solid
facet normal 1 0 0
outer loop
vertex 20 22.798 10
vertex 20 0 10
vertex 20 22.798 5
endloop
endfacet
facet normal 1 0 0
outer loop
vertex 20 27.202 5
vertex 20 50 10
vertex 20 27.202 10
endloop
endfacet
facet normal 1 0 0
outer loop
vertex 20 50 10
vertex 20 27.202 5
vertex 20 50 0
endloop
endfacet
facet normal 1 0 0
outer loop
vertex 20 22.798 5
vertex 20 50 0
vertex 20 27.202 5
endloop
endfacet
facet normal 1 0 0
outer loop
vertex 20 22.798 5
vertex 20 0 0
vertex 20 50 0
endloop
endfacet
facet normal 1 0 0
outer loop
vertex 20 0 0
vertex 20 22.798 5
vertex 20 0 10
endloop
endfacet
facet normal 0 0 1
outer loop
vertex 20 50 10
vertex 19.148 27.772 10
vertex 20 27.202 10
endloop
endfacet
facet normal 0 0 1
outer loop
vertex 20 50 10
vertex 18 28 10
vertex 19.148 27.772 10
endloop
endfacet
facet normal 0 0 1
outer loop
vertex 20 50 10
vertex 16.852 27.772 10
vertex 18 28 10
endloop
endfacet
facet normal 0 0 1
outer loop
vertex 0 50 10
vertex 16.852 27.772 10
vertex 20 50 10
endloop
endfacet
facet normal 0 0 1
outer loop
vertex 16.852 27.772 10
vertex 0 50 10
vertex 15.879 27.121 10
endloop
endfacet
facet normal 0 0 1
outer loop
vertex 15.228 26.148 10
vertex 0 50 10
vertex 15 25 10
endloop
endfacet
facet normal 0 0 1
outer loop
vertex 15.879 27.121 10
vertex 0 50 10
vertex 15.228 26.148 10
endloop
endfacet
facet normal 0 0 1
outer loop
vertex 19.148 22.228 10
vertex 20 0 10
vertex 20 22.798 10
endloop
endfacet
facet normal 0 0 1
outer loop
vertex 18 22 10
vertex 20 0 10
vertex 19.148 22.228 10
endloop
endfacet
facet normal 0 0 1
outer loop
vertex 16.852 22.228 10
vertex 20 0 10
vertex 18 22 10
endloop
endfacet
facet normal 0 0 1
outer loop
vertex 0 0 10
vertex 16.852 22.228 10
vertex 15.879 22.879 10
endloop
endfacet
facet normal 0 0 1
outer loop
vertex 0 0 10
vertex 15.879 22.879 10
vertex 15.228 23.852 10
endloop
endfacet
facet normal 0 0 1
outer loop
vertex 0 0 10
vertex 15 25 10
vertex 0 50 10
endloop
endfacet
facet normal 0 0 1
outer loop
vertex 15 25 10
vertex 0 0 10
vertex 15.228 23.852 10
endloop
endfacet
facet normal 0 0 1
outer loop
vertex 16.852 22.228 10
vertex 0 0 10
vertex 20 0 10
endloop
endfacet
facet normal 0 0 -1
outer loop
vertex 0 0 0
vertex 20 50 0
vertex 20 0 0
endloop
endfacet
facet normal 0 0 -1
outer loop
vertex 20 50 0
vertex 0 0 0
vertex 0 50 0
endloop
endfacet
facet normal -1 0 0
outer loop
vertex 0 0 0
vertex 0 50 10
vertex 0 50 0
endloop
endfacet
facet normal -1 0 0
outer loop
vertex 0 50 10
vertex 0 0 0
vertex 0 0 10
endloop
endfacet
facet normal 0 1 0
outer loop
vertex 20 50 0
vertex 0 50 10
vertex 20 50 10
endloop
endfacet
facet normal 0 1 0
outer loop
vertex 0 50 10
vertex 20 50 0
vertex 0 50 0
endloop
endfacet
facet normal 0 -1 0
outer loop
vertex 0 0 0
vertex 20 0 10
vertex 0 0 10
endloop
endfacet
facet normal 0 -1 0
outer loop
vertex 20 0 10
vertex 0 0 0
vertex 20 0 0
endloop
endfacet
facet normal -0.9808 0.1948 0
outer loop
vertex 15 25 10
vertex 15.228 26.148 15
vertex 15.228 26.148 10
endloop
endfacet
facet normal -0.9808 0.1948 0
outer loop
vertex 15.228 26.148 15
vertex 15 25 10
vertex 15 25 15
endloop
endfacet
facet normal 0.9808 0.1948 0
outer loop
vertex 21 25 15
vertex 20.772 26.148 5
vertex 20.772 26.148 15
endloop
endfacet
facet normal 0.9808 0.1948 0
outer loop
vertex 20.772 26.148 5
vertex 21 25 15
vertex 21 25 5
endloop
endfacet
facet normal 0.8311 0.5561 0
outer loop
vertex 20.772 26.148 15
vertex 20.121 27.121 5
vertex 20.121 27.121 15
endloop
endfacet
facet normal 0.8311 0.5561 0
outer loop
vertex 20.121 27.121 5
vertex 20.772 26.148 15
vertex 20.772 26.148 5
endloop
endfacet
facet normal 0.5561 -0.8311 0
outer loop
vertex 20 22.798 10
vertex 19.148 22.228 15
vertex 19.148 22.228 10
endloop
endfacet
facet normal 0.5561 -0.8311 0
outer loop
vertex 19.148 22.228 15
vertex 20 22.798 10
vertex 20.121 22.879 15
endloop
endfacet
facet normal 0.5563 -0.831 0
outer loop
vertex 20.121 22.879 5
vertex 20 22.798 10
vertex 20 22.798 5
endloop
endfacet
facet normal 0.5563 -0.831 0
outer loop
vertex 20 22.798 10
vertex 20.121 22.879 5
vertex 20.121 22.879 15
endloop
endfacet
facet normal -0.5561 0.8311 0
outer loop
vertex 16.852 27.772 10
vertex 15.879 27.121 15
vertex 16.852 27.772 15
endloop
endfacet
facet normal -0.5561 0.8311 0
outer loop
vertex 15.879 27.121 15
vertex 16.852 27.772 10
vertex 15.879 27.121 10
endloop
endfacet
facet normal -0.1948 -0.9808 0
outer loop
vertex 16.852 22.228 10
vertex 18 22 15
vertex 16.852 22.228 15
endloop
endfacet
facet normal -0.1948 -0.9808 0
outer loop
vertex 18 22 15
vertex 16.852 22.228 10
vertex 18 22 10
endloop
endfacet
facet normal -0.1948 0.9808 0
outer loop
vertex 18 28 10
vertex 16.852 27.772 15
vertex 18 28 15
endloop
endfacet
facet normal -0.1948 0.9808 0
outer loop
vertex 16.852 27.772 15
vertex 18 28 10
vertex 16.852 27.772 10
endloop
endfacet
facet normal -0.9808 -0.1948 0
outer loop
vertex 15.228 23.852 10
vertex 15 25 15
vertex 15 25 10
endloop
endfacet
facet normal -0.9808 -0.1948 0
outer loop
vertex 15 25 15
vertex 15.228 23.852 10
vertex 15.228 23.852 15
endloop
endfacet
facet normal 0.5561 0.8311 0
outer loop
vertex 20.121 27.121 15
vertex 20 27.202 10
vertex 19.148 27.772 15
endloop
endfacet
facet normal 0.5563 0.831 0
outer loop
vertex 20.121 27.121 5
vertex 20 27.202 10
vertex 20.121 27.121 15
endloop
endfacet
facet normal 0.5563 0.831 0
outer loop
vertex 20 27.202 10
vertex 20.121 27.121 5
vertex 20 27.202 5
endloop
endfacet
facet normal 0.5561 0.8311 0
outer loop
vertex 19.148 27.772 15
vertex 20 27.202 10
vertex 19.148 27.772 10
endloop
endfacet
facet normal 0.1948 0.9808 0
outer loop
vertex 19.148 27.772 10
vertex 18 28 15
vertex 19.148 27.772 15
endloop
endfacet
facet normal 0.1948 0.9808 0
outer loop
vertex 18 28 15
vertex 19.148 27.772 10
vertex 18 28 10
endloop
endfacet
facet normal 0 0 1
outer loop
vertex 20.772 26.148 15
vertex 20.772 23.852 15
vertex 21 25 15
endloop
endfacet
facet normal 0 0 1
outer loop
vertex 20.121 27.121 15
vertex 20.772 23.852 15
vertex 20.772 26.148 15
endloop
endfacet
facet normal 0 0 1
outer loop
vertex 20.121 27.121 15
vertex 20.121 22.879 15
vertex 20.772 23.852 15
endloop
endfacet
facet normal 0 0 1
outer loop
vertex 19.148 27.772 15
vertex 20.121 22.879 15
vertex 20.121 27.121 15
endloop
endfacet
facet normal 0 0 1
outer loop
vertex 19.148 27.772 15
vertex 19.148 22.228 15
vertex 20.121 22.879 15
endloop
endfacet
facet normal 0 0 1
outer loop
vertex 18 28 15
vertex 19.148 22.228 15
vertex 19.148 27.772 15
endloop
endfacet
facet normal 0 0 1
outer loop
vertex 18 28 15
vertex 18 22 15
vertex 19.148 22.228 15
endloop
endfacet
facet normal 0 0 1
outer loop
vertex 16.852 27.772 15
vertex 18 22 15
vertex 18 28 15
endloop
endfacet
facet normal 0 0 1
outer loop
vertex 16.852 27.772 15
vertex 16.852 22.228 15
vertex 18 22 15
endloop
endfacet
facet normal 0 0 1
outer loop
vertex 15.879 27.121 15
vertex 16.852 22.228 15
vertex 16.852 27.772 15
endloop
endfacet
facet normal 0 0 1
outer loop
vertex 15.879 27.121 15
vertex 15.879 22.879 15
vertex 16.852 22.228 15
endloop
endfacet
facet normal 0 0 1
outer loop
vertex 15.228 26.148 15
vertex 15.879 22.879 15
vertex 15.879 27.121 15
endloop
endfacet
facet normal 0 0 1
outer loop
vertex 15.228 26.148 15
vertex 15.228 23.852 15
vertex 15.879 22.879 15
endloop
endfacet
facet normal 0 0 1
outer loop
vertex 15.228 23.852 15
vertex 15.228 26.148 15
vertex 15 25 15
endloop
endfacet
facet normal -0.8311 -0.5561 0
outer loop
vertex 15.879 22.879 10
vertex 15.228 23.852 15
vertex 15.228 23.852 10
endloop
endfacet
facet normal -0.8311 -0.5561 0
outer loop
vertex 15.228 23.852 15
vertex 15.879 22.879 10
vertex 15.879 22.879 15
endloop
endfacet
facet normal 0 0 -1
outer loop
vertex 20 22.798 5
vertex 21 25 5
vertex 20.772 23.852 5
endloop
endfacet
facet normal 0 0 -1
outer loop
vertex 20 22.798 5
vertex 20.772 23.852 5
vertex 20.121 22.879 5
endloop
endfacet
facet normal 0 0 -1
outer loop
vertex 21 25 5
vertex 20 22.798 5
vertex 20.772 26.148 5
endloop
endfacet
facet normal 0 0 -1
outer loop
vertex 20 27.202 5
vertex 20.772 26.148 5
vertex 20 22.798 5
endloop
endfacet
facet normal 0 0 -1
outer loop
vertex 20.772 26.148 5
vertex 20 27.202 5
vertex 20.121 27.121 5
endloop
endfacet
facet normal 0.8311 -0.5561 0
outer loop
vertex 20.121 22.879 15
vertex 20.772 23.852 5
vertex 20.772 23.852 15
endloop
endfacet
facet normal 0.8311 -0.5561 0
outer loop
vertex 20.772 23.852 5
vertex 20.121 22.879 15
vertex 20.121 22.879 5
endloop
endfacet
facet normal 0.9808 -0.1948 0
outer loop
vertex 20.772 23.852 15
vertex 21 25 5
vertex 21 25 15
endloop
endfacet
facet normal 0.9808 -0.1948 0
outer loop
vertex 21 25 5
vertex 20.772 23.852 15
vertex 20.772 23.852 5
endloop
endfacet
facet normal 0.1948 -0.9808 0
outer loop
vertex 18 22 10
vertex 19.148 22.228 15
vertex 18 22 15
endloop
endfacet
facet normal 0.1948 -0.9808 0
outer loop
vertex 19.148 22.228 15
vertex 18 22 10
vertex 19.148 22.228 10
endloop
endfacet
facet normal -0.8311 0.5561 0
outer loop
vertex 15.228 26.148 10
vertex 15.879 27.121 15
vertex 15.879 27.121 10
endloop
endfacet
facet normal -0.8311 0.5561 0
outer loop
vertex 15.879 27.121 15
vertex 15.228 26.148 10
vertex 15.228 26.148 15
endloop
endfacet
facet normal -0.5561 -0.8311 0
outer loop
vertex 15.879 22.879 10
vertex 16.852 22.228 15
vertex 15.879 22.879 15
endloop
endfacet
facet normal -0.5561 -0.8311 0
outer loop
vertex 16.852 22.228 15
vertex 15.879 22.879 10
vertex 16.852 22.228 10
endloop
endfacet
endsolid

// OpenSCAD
// file: config.scad
// --- Robot Dimensions ---
track_width = 50;        // mm
sprocket_diameter = 50;  // mm
motor_length = 54;       // mm
motor_shaft = 6;         // D-shaft diameter
motor_mount_hole = 3;    // M3
battery_length = 75;     // mm
battery_width  = 55;     // mm
battery_height = 20;     // mm
jetson_plate_length = 120; // mm
jetson_plate_width  = 100; // mm
chassis_thickness = 5;      // mm
// main file
include <config.scad>;

module track_link() {
    link_length = 20;
    link_width  = track_width;
    link_height = 10;

    cube([link_length, link_width, link_height]);

    // Add pin sockets for interlocking
    translate([link_length-2, link_width/2, link_height/2])
        cylinder(h=link_height, r=3, $fn=16);
}

track_link();
